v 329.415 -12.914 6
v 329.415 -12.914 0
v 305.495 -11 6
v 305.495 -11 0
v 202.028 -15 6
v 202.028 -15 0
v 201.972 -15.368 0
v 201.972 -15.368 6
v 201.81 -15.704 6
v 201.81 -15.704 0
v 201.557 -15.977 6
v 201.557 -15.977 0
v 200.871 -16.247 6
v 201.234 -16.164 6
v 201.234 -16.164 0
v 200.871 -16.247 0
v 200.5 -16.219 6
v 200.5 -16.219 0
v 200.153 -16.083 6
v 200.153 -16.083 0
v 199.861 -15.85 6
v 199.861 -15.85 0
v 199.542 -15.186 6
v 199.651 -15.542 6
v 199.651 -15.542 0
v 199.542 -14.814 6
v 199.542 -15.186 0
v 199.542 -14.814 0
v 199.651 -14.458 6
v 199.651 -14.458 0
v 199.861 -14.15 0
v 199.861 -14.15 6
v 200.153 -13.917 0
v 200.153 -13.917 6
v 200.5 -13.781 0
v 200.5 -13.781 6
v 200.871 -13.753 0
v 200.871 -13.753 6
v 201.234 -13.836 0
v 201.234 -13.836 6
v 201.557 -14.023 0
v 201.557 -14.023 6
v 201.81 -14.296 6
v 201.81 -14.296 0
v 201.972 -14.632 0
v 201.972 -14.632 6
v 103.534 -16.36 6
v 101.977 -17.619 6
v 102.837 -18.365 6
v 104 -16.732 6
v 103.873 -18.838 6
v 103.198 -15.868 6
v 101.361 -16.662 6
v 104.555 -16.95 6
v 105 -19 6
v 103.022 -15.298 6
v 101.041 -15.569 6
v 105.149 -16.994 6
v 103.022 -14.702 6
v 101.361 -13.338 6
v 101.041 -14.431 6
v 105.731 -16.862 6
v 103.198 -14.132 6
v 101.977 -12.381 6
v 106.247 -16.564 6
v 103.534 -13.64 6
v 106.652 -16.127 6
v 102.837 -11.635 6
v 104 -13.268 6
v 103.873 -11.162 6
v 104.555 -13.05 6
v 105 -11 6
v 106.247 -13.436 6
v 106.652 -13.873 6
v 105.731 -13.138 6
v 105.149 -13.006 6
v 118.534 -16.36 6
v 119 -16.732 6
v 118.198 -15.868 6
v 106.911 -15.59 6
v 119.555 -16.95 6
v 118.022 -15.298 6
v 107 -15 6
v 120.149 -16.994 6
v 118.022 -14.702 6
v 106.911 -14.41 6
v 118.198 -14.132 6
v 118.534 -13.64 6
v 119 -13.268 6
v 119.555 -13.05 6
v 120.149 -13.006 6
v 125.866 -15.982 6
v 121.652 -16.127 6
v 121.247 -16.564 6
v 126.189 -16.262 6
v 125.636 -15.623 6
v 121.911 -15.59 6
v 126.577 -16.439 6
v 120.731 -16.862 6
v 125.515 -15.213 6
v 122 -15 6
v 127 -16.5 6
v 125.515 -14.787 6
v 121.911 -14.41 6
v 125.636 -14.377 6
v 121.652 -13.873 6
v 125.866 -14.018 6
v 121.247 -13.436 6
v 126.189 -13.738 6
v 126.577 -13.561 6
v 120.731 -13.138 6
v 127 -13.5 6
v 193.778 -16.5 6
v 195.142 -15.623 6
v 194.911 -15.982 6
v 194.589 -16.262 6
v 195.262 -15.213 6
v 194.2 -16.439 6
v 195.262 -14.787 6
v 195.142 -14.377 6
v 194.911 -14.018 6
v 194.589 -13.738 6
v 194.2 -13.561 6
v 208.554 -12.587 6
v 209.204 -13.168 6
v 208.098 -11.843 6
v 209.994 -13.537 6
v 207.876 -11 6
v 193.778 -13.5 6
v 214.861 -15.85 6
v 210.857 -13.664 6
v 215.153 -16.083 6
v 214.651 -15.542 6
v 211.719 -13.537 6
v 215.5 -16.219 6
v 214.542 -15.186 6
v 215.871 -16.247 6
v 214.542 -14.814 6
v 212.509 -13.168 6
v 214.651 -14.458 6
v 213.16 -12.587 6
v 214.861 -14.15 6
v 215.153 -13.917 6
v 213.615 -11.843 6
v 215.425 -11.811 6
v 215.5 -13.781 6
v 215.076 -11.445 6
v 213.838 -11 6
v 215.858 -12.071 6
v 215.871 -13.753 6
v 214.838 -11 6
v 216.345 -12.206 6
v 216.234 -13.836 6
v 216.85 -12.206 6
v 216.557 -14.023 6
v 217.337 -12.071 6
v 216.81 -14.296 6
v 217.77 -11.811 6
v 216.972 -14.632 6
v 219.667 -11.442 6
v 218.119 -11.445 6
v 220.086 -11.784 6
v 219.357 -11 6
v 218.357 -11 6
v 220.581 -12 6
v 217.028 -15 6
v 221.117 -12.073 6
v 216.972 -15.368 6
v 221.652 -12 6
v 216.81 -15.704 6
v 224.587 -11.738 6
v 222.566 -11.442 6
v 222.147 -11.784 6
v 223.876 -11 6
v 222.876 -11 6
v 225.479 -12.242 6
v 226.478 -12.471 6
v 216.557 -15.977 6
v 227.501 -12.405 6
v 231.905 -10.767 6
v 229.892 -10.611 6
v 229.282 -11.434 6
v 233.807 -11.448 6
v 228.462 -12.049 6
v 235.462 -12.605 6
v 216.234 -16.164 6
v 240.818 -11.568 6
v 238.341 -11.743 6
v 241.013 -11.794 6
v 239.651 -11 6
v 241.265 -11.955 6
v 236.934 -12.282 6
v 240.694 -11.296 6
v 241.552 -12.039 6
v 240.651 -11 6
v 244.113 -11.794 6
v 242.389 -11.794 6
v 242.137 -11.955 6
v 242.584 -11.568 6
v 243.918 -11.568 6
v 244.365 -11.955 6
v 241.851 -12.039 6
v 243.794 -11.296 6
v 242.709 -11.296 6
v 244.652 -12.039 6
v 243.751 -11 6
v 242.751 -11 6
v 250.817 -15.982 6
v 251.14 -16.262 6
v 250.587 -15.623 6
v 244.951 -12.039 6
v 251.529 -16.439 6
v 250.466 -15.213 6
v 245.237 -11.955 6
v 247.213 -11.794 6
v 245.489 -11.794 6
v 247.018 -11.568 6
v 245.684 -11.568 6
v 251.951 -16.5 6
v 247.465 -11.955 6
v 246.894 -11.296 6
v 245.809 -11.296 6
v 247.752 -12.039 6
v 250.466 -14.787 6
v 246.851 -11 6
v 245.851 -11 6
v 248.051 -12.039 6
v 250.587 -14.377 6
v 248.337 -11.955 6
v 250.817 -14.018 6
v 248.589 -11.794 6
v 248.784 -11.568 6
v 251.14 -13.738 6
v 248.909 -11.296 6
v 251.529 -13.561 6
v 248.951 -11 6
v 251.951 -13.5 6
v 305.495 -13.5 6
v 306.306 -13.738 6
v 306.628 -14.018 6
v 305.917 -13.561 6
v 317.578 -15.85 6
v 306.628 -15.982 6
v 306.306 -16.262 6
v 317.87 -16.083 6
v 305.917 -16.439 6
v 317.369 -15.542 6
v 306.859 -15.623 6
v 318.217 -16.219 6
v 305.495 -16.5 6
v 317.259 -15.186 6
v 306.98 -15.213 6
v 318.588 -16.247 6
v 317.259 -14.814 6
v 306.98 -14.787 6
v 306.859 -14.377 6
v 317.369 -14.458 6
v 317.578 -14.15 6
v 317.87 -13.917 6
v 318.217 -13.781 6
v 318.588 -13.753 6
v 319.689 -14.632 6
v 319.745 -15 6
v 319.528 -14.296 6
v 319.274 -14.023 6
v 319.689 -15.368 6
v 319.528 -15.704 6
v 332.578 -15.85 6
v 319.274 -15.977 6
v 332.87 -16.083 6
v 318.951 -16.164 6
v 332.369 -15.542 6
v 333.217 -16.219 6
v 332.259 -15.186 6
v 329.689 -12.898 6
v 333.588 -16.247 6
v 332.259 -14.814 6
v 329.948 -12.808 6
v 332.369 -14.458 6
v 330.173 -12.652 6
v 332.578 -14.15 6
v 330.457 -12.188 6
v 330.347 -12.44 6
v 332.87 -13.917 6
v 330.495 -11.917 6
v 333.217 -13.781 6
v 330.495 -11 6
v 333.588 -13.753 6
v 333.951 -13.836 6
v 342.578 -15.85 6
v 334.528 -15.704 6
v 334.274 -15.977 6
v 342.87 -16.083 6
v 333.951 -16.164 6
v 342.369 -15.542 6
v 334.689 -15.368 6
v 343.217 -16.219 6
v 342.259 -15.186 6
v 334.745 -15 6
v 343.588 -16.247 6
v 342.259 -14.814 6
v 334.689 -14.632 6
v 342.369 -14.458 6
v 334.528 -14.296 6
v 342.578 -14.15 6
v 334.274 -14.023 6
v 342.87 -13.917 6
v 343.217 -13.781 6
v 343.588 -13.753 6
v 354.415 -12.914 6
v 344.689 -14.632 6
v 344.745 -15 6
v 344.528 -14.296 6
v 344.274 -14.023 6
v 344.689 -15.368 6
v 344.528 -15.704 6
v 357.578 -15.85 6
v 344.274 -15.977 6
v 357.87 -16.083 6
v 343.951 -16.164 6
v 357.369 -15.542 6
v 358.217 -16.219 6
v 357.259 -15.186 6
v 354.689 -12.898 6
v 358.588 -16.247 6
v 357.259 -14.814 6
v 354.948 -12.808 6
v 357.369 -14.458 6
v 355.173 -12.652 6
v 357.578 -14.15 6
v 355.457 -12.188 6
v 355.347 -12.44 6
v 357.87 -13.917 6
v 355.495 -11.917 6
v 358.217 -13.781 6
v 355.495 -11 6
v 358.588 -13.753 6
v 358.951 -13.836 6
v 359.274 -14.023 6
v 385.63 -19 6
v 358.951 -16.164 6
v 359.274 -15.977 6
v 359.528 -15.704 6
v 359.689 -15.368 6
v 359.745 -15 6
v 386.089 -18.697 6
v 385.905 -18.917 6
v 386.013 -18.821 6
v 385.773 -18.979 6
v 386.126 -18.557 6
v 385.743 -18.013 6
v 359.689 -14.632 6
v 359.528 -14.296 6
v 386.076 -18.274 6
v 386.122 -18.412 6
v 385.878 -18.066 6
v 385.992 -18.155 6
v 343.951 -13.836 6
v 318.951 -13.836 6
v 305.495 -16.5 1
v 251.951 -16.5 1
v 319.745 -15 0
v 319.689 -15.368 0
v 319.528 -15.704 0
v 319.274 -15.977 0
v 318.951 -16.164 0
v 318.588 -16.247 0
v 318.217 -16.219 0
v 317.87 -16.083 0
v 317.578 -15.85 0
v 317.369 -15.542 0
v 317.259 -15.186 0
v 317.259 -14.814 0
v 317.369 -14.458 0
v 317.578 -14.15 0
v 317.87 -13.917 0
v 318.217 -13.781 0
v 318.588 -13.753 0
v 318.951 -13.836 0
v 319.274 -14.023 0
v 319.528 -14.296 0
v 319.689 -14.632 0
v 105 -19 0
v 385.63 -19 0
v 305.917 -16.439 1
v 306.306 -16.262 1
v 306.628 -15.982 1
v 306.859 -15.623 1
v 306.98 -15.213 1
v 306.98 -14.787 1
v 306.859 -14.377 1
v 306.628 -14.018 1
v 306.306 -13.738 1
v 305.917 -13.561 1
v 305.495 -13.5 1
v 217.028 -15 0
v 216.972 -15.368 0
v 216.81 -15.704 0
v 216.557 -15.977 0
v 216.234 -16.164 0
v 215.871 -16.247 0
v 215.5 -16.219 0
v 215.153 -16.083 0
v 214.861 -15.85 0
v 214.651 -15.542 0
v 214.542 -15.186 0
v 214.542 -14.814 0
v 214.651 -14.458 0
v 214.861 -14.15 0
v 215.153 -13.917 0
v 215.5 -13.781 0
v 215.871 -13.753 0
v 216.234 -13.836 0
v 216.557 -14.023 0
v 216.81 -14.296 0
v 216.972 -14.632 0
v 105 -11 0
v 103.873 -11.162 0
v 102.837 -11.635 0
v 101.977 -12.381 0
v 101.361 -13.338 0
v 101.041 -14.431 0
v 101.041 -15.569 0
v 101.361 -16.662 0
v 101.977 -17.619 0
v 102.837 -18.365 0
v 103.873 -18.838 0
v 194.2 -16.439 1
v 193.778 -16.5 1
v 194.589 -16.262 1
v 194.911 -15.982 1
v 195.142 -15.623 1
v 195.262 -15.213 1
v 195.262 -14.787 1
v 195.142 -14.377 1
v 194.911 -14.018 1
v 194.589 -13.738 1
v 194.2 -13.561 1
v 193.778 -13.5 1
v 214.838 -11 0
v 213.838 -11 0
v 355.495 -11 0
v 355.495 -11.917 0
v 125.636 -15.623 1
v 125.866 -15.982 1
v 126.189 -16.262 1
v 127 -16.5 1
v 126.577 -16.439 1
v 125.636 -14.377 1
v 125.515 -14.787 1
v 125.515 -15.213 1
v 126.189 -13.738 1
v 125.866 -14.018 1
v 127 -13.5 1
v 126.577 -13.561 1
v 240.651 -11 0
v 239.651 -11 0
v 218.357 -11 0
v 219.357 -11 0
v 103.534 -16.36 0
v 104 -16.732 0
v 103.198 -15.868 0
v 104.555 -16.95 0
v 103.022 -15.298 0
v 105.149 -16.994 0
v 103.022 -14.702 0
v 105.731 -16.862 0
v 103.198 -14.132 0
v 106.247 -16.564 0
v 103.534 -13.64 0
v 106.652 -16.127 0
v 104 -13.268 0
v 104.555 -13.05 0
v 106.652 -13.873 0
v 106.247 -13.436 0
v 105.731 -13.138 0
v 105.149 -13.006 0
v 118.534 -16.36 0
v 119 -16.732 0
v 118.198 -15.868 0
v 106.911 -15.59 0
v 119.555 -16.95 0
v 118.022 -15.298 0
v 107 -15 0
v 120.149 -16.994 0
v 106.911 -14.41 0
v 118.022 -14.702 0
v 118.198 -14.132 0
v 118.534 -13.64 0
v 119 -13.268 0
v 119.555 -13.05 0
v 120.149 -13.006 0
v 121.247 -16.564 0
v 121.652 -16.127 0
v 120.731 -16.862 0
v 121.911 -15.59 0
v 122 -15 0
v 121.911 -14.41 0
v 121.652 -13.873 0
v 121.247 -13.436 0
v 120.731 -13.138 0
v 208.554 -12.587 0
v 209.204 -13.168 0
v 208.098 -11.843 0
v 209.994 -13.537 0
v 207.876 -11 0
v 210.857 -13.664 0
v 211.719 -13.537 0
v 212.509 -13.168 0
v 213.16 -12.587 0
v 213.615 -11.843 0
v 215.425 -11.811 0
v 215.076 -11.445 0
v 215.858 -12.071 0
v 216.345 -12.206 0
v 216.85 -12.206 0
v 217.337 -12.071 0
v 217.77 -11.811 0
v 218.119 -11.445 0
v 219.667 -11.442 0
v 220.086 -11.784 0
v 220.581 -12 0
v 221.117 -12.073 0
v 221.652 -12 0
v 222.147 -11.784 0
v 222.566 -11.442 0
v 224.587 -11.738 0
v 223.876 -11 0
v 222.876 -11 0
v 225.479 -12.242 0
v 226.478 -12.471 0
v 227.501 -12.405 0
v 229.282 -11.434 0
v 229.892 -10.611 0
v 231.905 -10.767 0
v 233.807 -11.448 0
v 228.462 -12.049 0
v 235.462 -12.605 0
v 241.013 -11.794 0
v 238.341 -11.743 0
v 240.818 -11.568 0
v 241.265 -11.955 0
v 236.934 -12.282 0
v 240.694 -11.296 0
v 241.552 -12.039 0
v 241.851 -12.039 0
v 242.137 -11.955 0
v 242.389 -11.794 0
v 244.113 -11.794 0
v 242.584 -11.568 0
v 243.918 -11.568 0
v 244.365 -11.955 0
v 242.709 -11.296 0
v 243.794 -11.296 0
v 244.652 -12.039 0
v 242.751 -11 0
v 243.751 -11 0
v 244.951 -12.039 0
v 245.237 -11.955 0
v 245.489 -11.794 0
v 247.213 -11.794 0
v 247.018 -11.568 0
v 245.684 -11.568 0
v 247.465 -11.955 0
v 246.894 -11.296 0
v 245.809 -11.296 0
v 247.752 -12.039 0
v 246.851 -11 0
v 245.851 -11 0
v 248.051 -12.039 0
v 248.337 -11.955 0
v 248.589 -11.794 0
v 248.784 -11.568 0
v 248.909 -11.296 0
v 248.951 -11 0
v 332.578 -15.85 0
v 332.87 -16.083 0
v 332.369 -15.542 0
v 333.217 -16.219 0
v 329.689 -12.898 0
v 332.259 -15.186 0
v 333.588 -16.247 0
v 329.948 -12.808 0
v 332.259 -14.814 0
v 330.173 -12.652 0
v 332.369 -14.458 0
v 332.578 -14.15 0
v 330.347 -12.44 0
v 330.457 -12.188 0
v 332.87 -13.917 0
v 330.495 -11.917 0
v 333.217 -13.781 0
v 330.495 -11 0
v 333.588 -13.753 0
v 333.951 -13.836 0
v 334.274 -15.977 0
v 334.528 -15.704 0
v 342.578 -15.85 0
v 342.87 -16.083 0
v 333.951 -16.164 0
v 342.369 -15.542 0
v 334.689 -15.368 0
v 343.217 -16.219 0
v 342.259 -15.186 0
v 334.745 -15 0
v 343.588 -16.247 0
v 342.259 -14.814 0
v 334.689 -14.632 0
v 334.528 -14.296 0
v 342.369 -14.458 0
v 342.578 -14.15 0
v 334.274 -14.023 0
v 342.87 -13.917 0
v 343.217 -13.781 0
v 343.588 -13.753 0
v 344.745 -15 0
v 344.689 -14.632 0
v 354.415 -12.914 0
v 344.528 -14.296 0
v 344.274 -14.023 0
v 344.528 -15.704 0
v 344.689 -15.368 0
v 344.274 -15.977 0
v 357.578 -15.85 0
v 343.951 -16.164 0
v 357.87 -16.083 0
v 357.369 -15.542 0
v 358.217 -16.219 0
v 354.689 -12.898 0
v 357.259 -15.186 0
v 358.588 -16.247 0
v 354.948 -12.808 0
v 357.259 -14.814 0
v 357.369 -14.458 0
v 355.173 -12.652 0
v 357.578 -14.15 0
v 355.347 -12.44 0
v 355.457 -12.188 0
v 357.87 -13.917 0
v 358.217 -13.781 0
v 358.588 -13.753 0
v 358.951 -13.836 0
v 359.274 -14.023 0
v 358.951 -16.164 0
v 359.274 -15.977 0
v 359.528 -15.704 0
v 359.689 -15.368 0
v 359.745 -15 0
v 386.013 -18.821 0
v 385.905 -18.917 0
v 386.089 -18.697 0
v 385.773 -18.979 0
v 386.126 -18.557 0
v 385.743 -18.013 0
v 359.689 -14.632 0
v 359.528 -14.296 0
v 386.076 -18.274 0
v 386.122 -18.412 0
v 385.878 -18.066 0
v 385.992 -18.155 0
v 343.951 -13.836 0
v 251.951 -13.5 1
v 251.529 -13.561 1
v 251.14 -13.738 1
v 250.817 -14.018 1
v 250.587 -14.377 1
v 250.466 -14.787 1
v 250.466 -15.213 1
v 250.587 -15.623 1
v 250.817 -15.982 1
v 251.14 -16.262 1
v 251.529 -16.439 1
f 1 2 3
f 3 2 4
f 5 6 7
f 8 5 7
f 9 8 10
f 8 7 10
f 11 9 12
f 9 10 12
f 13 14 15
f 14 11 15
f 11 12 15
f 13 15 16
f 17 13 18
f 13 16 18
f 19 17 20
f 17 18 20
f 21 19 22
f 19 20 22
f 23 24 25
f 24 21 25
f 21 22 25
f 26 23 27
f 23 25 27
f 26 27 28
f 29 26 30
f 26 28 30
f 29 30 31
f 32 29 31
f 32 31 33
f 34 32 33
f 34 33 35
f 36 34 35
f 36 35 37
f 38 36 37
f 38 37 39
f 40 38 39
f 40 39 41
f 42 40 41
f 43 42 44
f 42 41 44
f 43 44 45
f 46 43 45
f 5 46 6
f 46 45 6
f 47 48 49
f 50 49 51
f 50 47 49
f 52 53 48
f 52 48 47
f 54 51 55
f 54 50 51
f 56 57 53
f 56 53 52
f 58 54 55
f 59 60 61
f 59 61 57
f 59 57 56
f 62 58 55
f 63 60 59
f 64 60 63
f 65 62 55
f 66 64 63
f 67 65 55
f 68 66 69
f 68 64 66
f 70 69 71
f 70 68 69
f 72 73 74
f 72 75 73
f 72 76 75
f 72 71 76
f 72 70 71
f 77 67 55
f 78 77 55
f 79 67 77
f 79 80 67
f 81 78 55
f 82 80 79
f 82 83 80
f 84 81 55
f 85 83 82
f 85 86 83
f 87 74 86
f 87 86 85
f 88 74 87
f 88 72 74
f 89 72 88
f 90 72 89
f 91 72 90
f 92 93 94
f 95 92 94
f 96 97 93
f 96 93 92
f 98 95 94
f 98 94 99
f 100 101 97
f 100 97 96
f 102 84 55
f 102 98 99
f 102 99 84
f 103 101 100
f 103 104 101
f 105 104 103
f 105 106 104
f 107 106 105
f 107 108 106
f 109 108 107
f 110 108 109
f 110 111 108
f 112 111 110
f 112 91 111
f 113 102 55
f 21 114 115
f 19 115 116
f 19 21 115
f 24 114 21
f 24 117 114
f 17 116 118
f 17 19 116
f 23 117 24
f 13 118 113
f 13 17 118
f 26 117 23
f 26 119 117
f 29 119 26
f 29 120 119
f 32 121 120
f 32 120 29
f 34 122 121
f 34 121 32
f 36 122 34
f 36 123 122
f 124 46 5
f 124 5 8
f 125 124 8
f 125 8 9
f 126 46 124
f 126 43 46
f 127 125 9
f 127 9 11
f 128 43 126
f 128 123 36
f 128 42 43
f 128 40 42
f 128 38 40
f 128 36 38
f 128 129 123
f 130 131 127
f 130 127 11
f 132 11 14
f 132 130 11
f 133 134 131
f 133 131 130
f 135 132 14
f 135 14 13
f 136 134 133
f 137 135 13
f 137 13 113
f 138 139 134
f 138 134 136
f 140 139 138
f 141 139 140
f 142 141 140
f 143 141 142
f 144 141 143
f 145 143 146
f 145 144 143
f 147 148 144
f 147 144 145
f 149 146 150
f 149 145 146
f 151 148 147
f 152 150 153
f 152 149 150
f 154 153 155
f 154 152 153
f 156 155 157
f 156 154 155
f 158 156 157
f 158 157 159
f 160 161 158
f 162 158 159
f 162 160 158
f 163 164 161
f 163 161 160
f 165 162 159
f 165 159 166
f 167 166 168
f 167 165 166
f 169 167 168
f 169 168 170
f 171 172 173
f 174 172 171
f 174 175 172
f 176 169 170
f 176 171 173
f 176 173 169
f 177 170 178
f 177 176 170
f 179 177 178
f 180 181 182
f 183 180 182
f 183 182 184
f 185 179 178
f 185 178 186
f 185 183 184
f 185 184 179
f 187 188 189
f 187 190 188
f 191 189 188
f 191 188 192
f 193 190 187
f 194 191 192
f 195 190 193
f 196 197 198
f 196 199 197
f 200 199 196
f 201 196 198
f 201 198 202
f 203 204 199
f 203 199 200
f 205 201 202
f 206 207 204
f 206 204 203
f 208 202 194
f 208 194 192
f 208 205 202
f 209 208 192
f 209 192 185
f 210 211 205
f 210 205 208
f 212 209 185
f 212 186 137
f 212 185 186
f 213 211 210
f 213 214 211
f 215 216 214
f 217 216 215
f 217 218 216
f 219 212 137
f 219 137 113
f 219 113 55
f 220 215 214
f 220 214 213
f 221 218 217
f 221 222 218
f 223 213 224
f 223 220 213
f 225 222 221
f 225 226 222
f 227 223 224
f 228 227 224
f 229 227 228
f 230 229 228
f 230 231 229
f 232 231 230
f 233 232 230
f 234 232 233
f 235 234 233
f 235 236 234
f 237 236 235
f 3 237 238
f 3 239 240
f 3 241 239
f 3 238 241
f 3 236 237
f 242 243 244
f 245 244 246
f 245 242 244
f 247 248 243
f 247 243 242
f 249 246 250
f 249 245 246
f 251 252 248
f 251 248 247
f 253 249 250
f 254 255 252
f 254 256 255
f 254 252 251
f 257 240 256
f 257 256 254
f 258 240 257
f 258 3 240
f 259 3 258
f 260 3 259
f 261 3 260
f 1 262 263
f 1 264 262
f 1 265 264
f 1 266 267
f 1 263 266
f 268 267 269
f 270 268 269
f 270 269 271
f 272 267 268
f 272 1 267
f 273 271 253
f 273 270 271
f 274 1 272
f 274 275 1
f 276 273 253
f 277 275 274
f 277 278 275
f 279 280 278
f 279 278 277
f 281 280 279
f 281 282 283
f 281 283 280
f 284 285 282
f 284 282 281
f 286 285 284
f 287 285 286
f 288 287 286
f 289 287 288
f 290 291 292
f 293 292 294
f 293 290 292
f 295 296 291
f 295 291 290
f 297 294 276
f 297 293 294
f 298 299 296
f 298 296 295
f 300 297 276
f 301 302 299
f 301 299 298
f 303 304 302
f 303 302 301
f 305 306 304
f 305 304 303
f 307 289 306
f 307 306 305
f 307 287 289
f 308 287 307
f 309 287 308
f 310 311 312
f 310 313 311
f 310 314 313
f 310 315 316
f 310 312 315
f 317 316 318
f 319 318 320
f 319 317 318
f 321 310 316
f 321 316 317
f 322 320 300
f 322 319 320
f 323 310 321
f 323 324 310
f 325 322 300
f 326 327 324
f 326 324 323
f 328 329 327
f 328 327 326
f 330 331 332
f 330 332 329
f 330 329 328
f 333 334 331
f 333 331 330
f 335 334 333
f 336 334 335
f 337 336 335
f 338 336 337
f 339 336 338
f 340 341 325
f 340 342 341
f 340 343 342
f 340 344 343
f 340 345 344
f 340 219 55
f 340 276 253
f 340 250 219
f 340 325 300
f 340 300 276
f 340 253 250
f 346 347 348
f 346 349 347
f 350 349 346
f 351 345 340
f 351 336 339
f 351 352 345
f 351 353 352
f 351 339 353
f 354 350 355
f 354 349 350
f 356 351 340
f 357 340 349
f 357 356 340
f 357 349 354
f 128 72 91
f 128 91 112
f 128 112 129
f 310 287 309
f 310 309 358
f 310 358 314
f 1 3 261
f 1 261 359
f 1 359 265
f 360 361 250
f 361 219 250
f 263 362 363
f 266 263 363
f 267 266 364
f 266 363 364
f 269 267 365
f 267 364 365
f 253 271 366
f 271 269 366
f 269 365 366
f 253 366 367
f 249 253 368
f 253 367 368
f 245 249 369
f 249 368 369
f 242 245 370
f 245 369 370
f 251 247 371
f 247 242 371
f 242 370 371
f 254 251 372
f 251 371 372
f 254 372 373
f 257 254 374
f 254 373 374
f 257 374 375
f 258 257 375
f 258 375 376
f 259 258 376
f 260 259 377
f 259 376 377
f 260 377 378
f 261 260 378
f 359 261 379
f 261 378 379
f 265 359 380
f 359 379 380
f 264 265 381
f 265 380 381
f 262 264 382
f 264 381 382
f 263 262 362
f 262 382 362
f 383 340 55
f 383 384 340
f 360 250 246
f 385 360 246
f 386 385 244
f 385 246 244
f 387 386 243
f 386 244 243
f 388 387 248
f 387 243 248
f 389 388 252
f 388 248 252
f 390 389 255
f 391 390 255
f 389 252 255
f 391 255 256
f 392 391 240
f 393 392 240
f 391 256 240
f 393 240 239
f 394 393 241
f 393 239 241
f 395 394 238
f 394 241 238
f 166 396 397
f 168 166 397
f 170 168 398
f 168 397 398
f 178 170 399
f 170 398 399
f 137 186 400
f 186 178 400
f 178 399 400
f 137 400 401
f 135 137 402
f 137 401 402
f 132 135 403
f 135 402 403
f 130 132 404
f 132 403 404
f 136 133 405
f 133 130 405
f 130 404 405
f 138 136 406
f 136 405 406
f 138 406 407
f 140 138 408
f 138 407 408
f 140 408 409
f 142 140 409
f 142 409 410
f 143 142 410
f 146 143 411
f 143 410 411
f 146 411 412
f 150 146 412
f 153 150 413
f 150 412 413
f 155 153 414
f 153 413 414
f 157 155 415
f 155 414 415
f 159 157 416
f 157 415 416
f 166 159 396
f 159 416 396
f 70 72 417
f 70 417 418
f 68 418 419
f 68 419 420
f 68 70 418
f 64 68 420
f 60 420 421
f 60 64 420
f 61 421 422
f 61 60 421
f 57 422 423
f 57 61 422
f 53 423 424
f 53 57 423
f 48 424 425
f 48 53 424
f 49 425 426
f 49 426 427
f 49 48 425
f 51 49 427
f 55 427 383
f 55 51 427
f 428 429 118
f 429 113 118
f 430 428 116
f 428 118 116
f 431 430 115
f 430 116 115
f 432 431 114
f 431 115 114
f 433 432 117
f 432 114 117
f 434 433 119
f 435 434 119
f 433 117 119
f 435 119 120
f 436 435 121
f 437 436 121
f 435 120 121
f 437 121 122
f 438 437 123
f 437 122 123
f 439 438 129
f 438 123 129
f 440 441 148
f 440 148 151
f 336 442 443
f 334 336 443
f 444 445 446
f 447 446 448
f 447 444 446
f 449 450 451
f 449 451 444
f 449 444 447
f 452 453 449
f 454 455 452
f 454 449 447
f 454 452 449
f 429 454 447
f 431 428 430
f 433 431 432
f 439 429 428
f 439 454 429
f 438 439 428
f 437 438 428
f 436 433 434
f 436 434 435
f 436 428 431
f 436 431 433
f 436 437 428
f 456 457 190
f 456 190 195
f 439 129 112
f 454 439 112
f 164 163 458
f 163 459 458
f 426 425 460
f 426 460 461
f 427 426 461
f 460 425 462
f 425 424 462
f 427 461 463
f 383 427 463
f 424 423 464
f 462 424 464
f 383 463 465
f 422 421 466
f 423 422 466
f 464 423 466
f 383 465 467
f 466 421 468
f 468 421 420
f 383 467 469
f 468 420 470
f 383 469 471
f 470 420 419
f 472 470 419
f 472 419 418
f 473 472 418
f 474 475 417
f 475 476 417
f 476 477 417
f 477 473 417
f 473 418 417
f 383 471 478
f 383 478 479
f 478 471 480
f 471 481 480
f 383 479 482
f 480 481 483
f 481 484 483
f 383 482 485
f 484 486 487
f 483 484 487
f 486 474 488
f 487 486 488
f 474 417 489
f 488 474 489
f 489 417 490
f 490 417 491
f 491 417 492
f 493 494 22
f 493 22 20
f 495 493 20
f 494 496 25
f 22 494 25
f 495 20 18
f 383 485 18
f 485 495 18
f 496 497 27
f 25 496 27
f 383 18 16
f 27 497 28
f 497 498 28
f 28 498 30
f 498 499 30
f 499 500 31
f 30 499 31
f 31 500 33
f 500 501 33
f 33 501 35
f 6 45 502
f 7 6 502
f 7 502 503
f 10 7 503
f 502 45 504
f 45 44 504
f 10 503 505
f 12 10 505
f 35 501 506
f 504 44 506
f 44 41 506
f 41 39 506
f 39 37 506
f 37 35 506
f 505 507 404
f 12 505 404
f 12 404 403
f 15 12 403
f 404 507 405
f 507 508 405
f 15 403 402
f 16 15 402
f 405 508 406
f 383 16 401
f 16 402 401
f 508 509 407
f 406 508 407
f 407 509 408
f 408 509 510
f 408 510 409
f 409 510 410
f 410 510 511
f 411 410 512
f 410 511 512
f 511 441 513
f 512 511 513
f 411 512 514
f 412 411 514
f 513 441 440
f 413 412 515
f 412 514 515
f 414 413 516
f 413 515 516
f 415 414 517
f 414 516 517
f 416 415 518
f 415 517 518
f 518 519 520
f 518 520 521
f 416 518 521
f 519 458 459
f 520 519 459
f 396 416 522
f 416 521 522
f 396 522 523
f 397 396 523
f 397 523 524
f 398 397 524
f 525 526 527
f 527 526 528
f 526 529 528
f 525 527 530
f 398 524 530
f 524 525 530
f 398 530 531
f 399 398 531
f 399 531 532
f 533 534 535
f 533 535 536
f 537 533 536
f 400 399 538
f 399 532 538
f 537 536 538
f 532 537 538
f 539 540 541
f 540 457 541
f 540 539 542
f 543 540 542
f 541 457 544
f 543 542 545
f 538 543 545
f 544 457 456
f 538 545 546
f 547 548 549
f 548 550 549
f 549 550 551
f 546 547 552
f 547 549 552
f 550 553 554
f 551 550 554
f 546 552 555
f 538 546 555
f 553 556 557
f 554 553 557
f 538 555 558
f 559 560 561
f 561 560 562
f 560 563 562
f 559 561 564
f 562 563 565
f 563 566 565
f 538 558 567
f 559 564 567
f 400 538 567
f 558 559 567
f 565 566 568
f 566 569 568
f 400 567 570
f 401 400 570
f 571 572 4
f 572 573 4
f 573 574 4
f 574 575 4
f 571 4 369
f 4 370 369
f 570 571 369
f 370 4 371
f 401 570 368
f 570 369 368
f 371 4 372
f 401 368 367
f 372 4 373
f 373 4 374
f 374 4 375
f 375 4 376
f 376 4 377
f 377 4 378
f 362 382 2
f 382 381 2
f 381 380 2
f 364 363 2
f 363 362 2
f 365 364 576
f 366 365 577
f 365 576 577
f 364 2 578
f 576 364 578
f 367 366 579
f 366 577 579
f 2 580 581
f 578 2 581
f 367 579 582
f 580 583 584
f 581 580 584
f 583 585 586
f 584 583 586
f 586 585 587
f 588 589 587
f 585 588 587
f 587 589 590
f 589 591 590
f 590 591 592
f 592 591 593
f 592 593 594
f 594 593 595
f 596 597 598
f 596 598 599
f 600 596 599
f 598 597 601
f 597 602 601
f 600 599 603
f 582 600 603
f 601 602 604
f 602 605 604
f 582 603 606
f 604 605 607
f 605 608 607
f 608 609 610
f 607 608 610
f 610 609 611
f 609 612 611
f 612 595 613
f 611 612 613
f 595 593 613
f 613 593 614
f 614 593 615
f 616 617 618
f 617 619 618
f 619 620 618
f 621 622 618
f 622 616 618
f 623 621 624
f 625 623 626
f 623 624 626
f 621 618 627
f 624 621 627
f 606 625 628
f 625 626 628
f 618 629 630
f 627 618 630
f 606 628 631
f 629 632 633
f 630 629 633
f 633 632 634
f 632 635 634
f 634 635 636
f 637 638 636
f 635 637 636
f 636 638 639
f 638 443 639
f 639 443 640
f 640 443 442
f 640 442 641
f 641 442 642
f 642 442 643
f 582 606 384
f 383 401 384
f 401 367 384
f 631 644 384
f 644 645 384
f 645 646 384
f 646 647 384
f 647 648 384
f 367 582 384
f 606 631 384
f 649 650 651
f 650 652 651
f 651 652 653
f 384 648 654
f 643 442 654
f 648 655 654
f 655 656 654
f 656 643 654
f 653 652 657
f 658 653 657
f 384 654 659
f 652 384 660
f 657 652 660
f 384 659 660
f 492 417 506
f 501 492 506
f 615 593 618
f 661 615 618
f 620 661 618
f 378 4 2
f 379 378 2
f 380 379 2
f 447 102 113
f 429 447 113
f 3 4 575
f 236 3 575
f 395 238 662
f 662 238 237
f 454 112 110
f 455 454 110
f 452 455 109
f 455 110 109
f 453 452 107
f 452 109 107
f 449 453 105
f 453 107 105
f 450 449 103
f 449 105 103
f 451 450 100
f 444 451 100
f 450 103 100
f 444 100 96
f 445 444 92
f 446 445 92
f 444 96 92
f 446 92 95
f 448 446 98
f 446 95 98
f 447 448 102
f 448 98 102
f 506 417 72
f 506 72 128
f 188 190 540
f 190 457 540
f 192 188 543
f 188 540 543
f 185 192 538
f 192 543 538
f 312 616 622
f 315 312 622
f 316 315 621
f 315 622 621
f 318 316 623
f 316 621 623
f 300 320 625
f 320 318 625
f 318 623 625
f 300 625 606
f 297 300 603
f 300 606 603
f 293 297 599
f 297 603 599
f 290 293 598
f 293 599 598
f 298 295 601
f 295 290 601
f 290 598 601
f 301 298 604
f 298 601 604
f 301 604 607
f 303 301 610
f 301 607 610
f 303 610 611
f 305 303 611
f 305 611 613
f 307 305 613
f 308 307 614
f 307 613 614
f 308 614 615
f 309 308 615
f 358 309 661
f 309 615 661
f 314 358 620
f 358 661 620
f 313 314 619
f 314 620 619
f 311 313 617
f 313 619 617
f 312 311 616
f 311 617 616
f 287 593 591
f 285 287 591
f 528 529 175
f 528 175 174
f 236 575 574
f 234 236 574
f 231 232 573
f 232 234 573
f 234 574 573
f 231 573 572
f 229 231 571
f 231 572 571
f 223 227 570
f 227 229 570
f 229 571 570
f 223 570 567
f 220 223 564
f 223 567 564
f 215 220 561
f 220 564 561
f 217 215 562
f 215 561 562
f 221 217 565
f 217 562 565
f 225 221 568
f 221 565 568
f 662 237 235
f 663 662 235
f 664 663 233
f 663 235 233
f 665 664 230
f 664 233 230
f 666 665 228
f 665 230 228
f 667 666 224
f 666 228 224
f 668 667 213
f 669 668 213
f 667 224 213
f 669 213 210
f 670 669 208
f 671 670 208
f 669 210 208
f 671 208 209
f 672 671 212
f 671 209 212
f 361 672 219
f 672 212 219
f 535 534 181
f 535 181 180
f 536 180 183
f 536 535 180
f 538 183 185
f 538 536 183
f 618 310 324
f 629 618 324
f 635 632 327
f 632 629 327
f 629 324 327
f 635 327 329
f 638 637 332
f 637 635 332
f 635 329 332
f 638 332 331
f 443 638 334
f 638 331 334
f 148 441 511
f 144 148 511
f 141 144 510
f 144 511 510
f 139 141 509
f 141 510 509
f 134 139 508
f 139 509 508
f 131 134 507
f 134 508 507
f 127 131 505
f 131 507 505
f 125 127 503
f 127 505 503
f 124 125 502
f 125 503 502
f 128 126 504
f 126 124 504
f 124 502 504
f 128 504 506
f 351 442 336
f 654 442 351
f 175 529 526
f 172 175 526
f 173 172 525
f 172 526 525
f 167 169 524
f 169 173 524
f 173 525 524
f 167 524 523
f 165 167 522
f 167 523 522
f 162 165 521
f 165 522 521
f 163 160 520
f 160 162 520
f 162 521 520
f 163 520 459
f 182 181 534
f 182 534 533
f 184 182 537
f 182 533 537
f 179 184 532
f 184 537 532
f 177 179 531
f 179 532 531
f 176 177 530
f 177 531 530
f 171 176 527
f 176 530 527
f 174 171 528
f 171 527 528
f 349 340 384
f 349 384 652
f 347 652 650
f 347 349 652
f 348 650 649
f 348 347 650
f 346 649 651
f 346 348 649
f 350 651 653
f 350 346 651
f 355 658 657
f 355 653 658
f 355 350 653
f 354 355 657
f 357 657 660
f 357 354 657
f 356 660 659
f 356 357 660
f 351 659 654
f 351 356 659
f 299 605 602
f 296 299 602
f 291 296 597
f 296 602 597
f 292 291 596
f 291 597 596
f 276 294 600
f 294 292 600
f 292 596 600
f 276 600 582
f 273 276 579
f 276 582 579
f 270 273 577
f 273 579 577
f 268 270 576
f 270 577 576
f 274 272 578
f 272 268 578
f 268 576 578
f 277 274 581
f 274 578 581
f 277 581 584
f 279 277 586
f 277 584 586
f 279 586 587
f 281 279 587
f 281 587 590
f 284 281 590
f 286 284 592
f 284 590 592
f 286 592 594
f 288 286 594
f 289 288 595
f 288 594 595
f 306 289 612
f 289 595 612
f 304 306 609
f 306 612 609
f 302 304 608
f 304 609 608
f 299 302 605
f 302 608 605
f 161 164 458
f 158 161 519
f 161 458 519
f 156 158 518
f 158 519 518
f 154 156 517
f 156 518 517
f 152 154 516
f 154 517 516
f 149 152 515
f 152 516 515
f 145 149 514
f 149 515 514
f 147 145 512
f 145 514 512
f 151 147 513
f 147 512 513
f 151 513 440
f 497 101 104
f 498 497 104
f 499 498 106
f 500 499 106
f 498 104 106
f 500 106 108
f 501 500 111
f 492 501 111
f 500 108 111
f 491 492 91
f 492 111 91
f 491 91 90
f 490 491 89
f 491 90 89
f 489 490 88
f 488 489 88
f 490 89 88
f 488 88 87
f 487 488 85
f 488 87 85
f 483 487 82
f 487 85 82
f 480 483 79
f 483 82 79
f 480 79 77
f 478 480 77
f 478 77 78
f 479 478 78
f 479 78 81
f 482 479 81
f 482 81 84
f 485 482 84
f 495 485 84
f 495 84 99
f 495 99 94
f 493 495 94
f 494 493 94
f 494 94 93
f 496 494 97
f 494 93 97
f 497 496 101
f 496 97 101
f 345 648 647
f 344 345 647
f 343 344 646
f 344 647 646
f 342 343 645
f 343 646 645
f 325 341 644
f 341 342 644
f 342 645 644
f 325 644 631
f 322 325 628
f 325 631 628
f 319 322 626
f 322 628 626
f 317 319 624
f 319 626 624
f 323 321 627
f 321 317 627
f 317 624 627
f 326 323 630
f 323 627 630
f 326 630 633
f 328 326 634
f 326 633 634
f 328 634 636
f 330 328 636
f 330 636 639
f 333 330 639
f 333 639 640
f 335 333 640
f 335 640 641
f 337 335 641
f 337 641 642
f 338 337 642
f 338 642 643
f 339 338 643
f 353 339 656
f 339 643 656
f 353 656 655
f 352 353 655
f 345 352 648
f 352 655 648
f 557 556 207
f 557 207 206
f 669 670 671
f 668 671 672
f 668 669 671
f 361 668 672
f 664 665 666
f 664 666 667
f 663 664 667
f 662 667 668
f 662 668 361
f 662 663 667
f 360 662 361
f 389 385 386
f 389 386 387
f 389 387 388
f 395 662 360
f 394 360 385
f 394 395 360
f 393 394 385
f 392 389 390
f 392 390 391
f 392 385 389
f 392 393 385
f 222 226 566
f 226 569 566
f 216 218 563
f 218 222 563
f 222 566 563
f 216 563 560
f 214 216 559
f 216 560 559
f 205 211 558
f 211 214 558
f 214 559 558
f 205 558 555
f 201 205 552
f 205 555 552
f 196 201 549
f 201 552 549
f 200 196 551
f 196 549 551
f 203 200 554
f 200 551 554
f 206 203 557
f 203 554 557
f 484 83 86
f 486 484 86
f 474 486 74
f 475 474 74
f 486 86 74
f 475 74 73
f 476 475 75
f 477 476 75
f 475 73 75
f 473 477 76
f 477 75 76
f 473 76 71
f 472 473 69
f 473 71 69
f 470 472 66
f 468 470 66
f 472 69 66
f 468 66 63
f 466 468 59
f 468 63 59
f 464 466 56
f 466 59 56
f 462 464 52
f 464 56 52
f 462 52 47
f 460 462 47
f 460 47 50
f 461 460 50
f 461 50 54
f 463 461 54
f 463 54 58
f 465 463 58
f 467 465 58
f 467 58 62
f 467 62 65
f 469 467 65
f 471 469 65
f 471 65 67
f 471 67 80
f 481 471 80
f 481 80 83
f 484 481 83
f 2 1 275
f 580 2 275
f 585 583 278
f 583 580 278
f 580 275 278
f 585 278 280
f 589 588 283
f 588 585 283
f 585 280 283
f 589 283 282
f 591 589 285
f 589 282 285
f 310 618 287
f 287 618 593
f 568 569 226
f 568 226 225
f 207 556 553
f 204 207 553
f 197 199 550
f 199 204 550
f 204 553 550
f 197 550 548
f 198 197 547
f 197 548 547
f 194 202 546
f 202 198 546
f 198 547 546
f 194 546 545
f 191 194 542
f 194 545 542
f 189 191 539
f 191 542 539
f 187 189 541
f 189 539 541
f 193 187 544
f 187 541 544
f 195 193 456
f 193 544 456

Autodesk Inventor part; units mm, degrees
ref_plane "YZ Plane" through (0, 0, 0) normal (1, 0, 0) x (0, 1, 0)
ref_plane "XZ Plane" through (0, 0, 0) normal (0, 1, 0) x (-1, 0, 0)
ref_plane "XY Plane" through (0, 0, 0) normal (0, 0, 1) x (1, 0, 0)
sketch "スケッチ1" plane through (0, 0, 0) normal (0, 0, 1) x (1, 0, 0)
  circle A0 centre (0, 0) radius 2
  circle A1 centre (15, 0) radius 2
  arc A2 (-0.2273, 4.9948) -> (-2.9263, -4.0542) centre (0, 0) ccw
  circle A3 centre (55, 0) radius 1.5
  circle A4 centre (55, 0) radius 4.025
  arc A5 (57.9262, 6.3865) -> (54.6807, 7.0177) centre (55, 0) ccw
  arc A6 (46.6204, -10.301) -> (48.0377, -5.2999) centre (45.4517, -7.2684) ccw
  line L0 (80, -19) -> (95, -19)
  circle A7 centre (95, -15) radius 2
  circle A8 centre (80, -15) radius 2
  arc A9 (95, -19) -> (96.6662, -11.3635) centre (95, -15) ccw
  circle A10 centre (80, -15) radius 4 construction
  line L1 (48.2385, -19) -> (80, -19)
  line L2 (57.9262, 6.3865) -> (96.6662, -11.3635)
  arc A11 (46.3293, 1.1755) -> (48.0377, -5.2999) centre (55, 0) ccw
  arc A12 (62.367, -1.4063) -> (54.6591, 7.4922) centre (55, 0) ccw
  line L3 (-0.2273, 4.9948) -> (54.6591, 7.4922)
  circle A13 centre (13, -10) radius 1.5
  arc A14 (10.3663, -13.6488) -> (12.3637, -14.4548) centre (13, -10) ccw
  line L4 (-2.9263, -4.0542) -> (10.3663, -13.6488)
  arc A15 (54.3637, -20.4538) -> (59.4202, -16.8428) centre (55, -15.999) ccw
  line L5 (12.3637, -14.4548) -> (54.3637, -20.4538)
  line L6 (59.4202, -16.8428) -> (62.367, -1.4063)
  circle A16 centre (66.7169, -2.5911) radius 1.5
  circle A17 centre (66.7169, -2.5911) radius 4.5 construction
  circle A18 centre (48.2385, -14.5) radius 1.5
  arc A19 (46.6204, -10.301) -> (48.2385, -19) centre (48.2385, -14.5) ccw
  arc A20 (80, -11) -> (80, -19) centre (80, -15) ccw
  line L7 (355.4948, -11) -> (390, -19)
  line L8 (390, -19) -> (80, -19)
  circle A21 centre (358.4948, -15) radius 1.25
  circle A22 centre (343.4948, -15) radius 1.25
  circle A23 centre (333.4948, -15) radius 1.25
  circle A24 centre (318.4948, -15) radius 1.25
  line L9 (80, -11) -> (207.8755, -11)
  line L10 (355.4948, -11) -> (248.9511, -11)
  arc A25 (213.7823, -10) -> (213.8378, -11) centre (210.8567, -10.6639) ccw
  line L11 (213.7823, -10) -> (214.7761, -9.8894)
  line L12 (213.8378, -11) -> (214.8378, -11)
  line L13 (219.357, -11) -> (218.357, -11)
  line L14 (218.2737, -9.5) -> (219.2676, -9.3894)
  line L15 (222.8762, -11) -> (223.8762, -11)
  line L16 (222.7652, -9) -> (223.7591, -8.8894)
  arc A26 (214.8378, -11) -> (218.357, -11) centre (216.5974, -10.3453) ccw
  arc A27 (218.2737, -9.5) -> (214.7761, -9.8894) centre (216.5974, -10.3453) ccw
  arc A28 (219.357, -11) -> (222.8762, -11) centre (221.1166, -10.0946) ccw
  arc A29 (222.7652, -9) -> (219.2676, -9.3894) centre (221.1166, -10.0946) ccw
  line L17 (210.8567, -10.6639) -> (233.0155, -9.4343) construction
  arc A30 (223.8762, -11) -> (229.892, -10.6107) centre (226.7628, -8.9308) ccw
  arc A31 (226.8407, -8.7739) -> (223.7591, -8.8894) centre (225.3075, -9.0352) ccw
  arc A32 (226.8407, -8.7739) -> (230.4998, -7.0068) centre (226.5478, -3.4953) ccw
  arc A33 (233.6316, -8.397) -> (230.4998, -7.0068) centre (231.2455, -9.5496) ccw
  arc A34 (235.4619, -12.6053) -> (229.892, -10.6107) centre (230.3136, -18.2076) ccw
  arc A35 (235.4619, -12.6053) -> (239.6511, -11) centre (234.0497, -2.6513) ccw
  arc A36 (259.6965, 4.4867) -> (265.8152, 14.9495) centre (248.2498, 18.2013) ccw
  arc A37 (220.191, -4.195) -> (265.8152, 14.9495) centre (219.3797, 61.6752) ccw
  line L18 (220.191, -4.195) -> (207.615, -4.3499)
  arc A38 (196.7777, -11) -> (207.615, -4.3499) centre (196.7777, 1.1554) ccw
  line L19 (222.8762, -11) -> (240.076, -10.0456) construction
  line L20 (222.7652, -9) -> (239.478, -8.0726) construction
  line L21 (239.6511, -11) -> (240.6511, -11)
  arc A39 (240.6511, -11) -> (242.7511, -11) centre (241.7011, -11) ccw
  line L22 (242.7511, -11) -> (243.7511, -11)
  arc A40 (243.7511, -11) -> (245.8511, -11) centre (244.8011, -11) ccw
  line L23 (245.8511, -11) -> (246.8511, -11)
  arc A41 (246.8511, -11) -> (248.9511, -11) centre (247.9011, -11) ccw
  arc A42 (240.735, -6.337) -> (238.7449, -7.0075) centre (239.7428, -6.6807) ccw
  arc A43 (243.5362, -5.2633) -> (241.5809, -6.0291) centre (242.5618, -5.6544) ccw
  arc A44 (246.2823, -4.0554) -> (244.3663, -4.9148) centre (245.3279, -4.4932) ccw
  arc A45 (248.9668, -2.7162) -> (247.0946, -3.6672) centre (248.0347, -3.1996) ccw
  arc A46 (233.6316, -8.397) -> (238.7449, -7.0075) centre (219.9279, 52.1342) ccw
  arc A47 (240.735, -6.337) -> (241.5809, -6.0291) centre (219.9279, 52.1342) ccw
  arc A48 (243.5362, -5.2633) -> (244.3663, -4.9148) centre (219.9279, 52.1342) ccw
  arc A49 (246.2823, -4.0554) -> (247.0946, -3.6672) centre (219.9279, 52.1342) ccw
  arc A50 (248.9668, -2.7162) -> (259.6965, 4.4867) centre (219.9279, 52.1342) ccw
  line L24 (196.7777, -11) -> (196.7777, -15)
  circle A51 centre (200.7777, -15) radius 1.25
  circle A52 centre (215.7777, -15) radius 1.25
  arc A53 (196.7777, -15) -> (200.7777, -19) centre (200.7777, -15) ccw
  arc A54 (215.7777, -19) -> (217.9536, -11.6436) centre (215.7777, -15) ccw
  circle A55 centre (200.7777, -15) radius 1.5
  circle A56 centre (215.7777, -15) radius 1.5
  line L25 (200.7777, -19) -> (215.7777, -19)
  circle A57 centre (45.4517, -7.2684) radius 1.5
  arc A58 (46.3293, 1.1755) -> (44.1782, 4.6812) centre (43.1088, 1.6121) ccw
  line L26 (54.6807, 7.0177) -> (44.8362, 6.5698)
  line L27 (44.8362, 6.5698) -> (44.1782, 4.6812)
  line L28 (355.4948, -11) -> (355.4948, -13)
  line L29 (355.4948, -13) -> (330.4948, -11)
  line L30 (330.4948, -11) -> (330.4948, -13)
  line L31 (330.4948, -13) -> (305.4948, -11)
  dimension "d0" = 4
  dimension "d1" = 4
  dimension "d2" = 15
  dimension "d3" = 3
  dimension "d4" = 3
  dimension "d8" = 8.05
  dimension "d9" = 3
  dimension "d10" = 6.5
  dimension "d11" = 4
  dimension "d12" = 4
  dimension "d15" = 15
  dimension "d16" = 15
  dimension "d18" = 3
  dimension "d19" = 3
  dimension "d23" = 3
  dimension "d25" = 40
  dimension "d26" = 40
  dimension "d28" = 15
  dimension "d29" = 13
  dimension "d34" = 3
  dimension "d35" = 3
  dimension "d36" = 3
  dimension "d37" = 8
  dimension "d38" = 390
  dimension "d40" = 4
  dimension "d41" = 8
  dimension "d42" = 2.5
  dimension "d43" = 2.5
  dimension "d44" = 2.5
  dimension "d45" = 2.5
  dimension "d46" = 4
  dimension "d47" = 15
  dimension "d48" = 10
  dimension "d49" = 15
  dimension "d51" = 6
  dimension "d59" = 1
  dimension "d60" = 1.5
  dimension "d61" = 1
  dimension "d62" = 1
  dimension "d63" = 1
  dimension "d64" = 2
  dimension "d65" = 1
  dimension "d66" = 1.0015
  dimension "d67" = 1.0015
  dimension "d68" = 0.7511
  dimension "d69" = 0.7511
  dimension "d70" = 3.176
  dimension "d71" = 3.176
  dimension "d73" = 1.05
  dimension "d74" = 1.05
  dimension "d75" = 1.05
  dimension "d76" = 1
  dimension "d77" = 1
  dimension "d78" = 1
  dimension "d79" = 2.1
  dimension "d80" = 2.1
  dimension "d81" = 2.1
  dimension "d82" = 2.1
  dimension "d83" = 3
  dimension "d84" = 3
  dimension "d85" = 3
  dimension "d88" = 2.5
  dimension "d89" = 2.5
  dimension "d90" = 15
extrude "押し出し1" add sketch "スケッチ1" along normal blind 6 contours L9 L24 A53 L8 A9 L2 | L2 A9 L0 A20 L9 | L9 A25 L12 A26 A54 L8 A53 L24 | A54 A26 L13 A28 L15 A30 A34 A35 L21 A39 L22 A40 L23 A41 L10 L31 L30 L29 L28 L7 L8 | A55 | A56
sketch "スケッチ2" plane through (0, 0, 6) normal (0, 0, 1) x (1, 0, 0)
  circle A0 centre (215.7777, -15) radius 1.25 projected
  circle A1 centre (200.7777, -15) radius 1.25 projected
  circle A2 centre (80, -15) radius 2 projected
  circle A3 centre (95, -15) radius 2 projected
  circle A4 centre (318.4948, -15) radius 1.25 projected
  circle A5 centre (333.4948, -15) radius 1.25 projected
  circle A6 centre (343.4948, -15) radius 1.25 projected
  circle A7 centre (358.4948, -15) radius 1.25 projected
  arc A8 (80, -11) -> (80, -19) centre (80, -15) ccw projected
  line L0 (80, -19) -> (390, -19) projected
  line L1 (390, -19) -> (355.4948, -11) projected
  line L2 (305.4948, -11) -> (248.9511, -11) projected
  arc A9 (246.8511, -11) -> (248.9511, -11) centre (247.9011, -11) ccw projected
  line L3 (246.8511, -11) -> (245.8511, -11) projected
  arc A10 (243.7511, -11) -> (245.8511, -11) centre (244.8011, -11) ccw projected
  line L4 (243.7511, -11) -> (242.7511, -11) projected
  arc A11 (240.6511, -11) -> (242.7511, -11) centre (241.7011, -11) ccw projected
  line L5 (240.6511, -11) -> (239.6511, -11) projected
  arc A12 (235.4619, -12.6053) -> (239.6511, -11) centre (234.0497, -2.6513) ccw projected
  arc A13 (235.4619, -12.6053) -> (229.892, -10.6107) centre (230.3136, -18.2076) ccw projected
  arc A14 (223.8762, -11) -> (229.892, -10.6107) centre (226.7628, -8.9308) ccw projected
  line L6 (223.8762, -11) -> (222.8762, -11) projected
  arc A15 (219.357, -11) -> (222.8762, -11) centre (221.1166, -10.0946) ccw projected
  line L7 (219.357, -11) -> (218.357, -11) projected
  arc A16 (214.8378, -11) -> (218.357, -11) centre (216.5974, -10.3453) ccw projected
  line L8 (214.8378, -11) -> (213.8378, -11) projected
  arc A17 (207.8755, -11) -> (213.8378, -11) centre (210.8567, -10.6639) ccw projected
  line L9 (207.8755, -11) -> (80, -11) projected
  circle A18 centre (105, -15) radius 2
  circle A19 centre (120, -15) radius 2
  arc A20 (105, -11) -> (105, -19) centre (105, -15) ccw
  line L10 (207.8755, -11) -> (80, -11) projected
  line L11 (330.4948, -11) -> (330.4948, -13) projected
  line L12 (330.4948, -13) -> (305.4948, -11) projected
  line L13 (355.4948, -11) -> (355.4948, -13) projected
  line L14 (355.4948, -13) -> (330.4948, -11) projected
  point P0 (0, 0)
  dimension "d114" = 4
  dimension "d115" = 4
  dimension "d116" = 15
  dimension "d117" = 4
  dimension "d119" = 25
extrude "押し出し2" cut sketch "スケッチ2" against normal blind 10 contours L9 A20 L0 A8 | A18 | A19
fillet "フィレット1" radius 0.5 1 edges at (390, -19, 3)
fillet "フィレット2" radius 1 2 edges at (355.4948, -13, 3) (330.4948, -13, 3)
sketch "スケッチ3" plane through (0, 0, 6) normal (0, 0, 1) x (1, 0, 0)
  arc A0 (385.6296, -19) -> (385.7426, -18.0129) centre (385.6296, -18.5) ccw projected
  line L0 (385.7426, -18.0129) -> (355.4948, -11) projected
  line L1 (355.4948, -11) -> (355.4948, -11.9168) projected
  arc A1 (354.4151, -12.9136) -> (355.4948, -11.9168) centre (354.4948, -11.9168) ccw projected
  line L2 (354.4151, -12.9136) -> (330.4948, -11) projected
  line L3 (330.4948, -11) -> (330.4948, -11.9168) projected
  arc A2 (329.4151, -12.9136) -> (330.4948, -11.9168) centre (329.4948, -11.9168) ccw projected
  line L4 (329.4151, -12.9136) -> (305.4948, -11) projected
  line L5 (305.4948, -11) -> (248.9511, -11) projected
  arc A3 (246.8511, -11) -> (248.9511, -11) centre (247.9011, -11) ccw projected
  line L6 (246.8511, -11) -> (245.8511, -11) projected
  arc A4 (243.7511, -11) -> (245.8511, -11) centre (244.8011, -11) ccw projected
  line L7 (243.7511, -11) -> (242.7511, -11) projected
  arc A5 (240.6511, -11) -> (242.7511, -11) centre (241.7011, -11) ccw projected
  line L8 (240.6511, -11) -> (239.6511, -11) projected
  arc A6 (235.4619, -12.6053) -> (239.6511, -11) centre (234.0497, -2.6513) ccw projected
  arc A7 (235.4619, -12.6053) -> (229.892, -10.6107) centre (230.3136, -18.2076) ccw projected
  arc A8 (223.8762, -11) -> (229.892, -10.6107) centre (226.7628, -8.9308) ccw projected
  line L9 (223.8762, -11) -> (222.8762, -11) projected
  arc A9 (219.357, -11) -> (222.8762, -11) centre (221.1166, -10.0946) ccw projected
  line L10 (219.357, -11) -> (218.357, -11) projected
  arc A10 (214.8378, -11) -> (218.357, -11) centre (216.5974, -10.3453) ccw projected
  line L11 (214.8378, -11) -> (213.8378, -11) projected
  arc A11 (207.8755, -11) -> (213.8378, -11) centre (210.8567, -10.6639) ccw projected
  line L12 (207.8755, -11) -> (105, -11) projected
  arc A12 (105, -11) -> (105, -19) centre (105, -15) ccw projected
  line L13 (105, -19) -> (385.6296, -19) projected
  circle A13 centre (318.4948, -15) radius 1.25 projected
  circle A14 centre (333.4948, -15) radius 1.25 projected
  circle A15 centre (343.4948, -15) radius 1.25 projected
  circle A16 centre (358.4948, -15) radius 1.25 projected
  circle A17 centre (200.7777, -15) radius 1.25 projected
  circle A18 centre (215.7777, -15) radius 1.25 projected
  circle A19 centre (120, -15) radius 2 projected
  circle A20 centre (105, -15) radius 2 projected
  line L14 (127, -15) -> (193.7777, -15) construction
  line L15 (127, -16.5) -> (193.7777, -16.5)
  line L16 (193.7777, -13.5) -> (127, -13.5)
  arc A21 (127, -13.5) -> (127, -16.5) centre (127, -15) ccw
  arc A22 (193.7777, -16.5) -> (193.7777, -13.5) centre (193.7777, -15) ccw
  line L17 (251.9511, -15) -> (305.4948, -15) construction
  line L18 (251.9511, -16.5) -> (305.4948, -16.5)
  line L19 (305.4948, -13.5) -> (251.9511, -13.5)
  arc A23 (251.9511, -13.5) -> (251.9511, -16.5) centre (251.9511, -15) ccw
  arc A24 (305.4948, -16.5) -> (305.4948, -13.5) centre (305.4948, -15) ccw
  point P0 (0, 0)
  point P1 (160.3889, -15)
  point P2 (278.723, -15)
  dimension "d129" = 3
  dimension "d130" = 3
  dimension "d131" = 7
  dimension "d132" = 7
  dimension "d133" = 3
  dimension "d134" = 0
extrude "押し出し3" cut sketch "スケッチ3" against normal blind 5 contours A21 L16 A22 L15 | A23 L19 A24 L18
properties part number "ロッド" material "アルミニウム 7075"
